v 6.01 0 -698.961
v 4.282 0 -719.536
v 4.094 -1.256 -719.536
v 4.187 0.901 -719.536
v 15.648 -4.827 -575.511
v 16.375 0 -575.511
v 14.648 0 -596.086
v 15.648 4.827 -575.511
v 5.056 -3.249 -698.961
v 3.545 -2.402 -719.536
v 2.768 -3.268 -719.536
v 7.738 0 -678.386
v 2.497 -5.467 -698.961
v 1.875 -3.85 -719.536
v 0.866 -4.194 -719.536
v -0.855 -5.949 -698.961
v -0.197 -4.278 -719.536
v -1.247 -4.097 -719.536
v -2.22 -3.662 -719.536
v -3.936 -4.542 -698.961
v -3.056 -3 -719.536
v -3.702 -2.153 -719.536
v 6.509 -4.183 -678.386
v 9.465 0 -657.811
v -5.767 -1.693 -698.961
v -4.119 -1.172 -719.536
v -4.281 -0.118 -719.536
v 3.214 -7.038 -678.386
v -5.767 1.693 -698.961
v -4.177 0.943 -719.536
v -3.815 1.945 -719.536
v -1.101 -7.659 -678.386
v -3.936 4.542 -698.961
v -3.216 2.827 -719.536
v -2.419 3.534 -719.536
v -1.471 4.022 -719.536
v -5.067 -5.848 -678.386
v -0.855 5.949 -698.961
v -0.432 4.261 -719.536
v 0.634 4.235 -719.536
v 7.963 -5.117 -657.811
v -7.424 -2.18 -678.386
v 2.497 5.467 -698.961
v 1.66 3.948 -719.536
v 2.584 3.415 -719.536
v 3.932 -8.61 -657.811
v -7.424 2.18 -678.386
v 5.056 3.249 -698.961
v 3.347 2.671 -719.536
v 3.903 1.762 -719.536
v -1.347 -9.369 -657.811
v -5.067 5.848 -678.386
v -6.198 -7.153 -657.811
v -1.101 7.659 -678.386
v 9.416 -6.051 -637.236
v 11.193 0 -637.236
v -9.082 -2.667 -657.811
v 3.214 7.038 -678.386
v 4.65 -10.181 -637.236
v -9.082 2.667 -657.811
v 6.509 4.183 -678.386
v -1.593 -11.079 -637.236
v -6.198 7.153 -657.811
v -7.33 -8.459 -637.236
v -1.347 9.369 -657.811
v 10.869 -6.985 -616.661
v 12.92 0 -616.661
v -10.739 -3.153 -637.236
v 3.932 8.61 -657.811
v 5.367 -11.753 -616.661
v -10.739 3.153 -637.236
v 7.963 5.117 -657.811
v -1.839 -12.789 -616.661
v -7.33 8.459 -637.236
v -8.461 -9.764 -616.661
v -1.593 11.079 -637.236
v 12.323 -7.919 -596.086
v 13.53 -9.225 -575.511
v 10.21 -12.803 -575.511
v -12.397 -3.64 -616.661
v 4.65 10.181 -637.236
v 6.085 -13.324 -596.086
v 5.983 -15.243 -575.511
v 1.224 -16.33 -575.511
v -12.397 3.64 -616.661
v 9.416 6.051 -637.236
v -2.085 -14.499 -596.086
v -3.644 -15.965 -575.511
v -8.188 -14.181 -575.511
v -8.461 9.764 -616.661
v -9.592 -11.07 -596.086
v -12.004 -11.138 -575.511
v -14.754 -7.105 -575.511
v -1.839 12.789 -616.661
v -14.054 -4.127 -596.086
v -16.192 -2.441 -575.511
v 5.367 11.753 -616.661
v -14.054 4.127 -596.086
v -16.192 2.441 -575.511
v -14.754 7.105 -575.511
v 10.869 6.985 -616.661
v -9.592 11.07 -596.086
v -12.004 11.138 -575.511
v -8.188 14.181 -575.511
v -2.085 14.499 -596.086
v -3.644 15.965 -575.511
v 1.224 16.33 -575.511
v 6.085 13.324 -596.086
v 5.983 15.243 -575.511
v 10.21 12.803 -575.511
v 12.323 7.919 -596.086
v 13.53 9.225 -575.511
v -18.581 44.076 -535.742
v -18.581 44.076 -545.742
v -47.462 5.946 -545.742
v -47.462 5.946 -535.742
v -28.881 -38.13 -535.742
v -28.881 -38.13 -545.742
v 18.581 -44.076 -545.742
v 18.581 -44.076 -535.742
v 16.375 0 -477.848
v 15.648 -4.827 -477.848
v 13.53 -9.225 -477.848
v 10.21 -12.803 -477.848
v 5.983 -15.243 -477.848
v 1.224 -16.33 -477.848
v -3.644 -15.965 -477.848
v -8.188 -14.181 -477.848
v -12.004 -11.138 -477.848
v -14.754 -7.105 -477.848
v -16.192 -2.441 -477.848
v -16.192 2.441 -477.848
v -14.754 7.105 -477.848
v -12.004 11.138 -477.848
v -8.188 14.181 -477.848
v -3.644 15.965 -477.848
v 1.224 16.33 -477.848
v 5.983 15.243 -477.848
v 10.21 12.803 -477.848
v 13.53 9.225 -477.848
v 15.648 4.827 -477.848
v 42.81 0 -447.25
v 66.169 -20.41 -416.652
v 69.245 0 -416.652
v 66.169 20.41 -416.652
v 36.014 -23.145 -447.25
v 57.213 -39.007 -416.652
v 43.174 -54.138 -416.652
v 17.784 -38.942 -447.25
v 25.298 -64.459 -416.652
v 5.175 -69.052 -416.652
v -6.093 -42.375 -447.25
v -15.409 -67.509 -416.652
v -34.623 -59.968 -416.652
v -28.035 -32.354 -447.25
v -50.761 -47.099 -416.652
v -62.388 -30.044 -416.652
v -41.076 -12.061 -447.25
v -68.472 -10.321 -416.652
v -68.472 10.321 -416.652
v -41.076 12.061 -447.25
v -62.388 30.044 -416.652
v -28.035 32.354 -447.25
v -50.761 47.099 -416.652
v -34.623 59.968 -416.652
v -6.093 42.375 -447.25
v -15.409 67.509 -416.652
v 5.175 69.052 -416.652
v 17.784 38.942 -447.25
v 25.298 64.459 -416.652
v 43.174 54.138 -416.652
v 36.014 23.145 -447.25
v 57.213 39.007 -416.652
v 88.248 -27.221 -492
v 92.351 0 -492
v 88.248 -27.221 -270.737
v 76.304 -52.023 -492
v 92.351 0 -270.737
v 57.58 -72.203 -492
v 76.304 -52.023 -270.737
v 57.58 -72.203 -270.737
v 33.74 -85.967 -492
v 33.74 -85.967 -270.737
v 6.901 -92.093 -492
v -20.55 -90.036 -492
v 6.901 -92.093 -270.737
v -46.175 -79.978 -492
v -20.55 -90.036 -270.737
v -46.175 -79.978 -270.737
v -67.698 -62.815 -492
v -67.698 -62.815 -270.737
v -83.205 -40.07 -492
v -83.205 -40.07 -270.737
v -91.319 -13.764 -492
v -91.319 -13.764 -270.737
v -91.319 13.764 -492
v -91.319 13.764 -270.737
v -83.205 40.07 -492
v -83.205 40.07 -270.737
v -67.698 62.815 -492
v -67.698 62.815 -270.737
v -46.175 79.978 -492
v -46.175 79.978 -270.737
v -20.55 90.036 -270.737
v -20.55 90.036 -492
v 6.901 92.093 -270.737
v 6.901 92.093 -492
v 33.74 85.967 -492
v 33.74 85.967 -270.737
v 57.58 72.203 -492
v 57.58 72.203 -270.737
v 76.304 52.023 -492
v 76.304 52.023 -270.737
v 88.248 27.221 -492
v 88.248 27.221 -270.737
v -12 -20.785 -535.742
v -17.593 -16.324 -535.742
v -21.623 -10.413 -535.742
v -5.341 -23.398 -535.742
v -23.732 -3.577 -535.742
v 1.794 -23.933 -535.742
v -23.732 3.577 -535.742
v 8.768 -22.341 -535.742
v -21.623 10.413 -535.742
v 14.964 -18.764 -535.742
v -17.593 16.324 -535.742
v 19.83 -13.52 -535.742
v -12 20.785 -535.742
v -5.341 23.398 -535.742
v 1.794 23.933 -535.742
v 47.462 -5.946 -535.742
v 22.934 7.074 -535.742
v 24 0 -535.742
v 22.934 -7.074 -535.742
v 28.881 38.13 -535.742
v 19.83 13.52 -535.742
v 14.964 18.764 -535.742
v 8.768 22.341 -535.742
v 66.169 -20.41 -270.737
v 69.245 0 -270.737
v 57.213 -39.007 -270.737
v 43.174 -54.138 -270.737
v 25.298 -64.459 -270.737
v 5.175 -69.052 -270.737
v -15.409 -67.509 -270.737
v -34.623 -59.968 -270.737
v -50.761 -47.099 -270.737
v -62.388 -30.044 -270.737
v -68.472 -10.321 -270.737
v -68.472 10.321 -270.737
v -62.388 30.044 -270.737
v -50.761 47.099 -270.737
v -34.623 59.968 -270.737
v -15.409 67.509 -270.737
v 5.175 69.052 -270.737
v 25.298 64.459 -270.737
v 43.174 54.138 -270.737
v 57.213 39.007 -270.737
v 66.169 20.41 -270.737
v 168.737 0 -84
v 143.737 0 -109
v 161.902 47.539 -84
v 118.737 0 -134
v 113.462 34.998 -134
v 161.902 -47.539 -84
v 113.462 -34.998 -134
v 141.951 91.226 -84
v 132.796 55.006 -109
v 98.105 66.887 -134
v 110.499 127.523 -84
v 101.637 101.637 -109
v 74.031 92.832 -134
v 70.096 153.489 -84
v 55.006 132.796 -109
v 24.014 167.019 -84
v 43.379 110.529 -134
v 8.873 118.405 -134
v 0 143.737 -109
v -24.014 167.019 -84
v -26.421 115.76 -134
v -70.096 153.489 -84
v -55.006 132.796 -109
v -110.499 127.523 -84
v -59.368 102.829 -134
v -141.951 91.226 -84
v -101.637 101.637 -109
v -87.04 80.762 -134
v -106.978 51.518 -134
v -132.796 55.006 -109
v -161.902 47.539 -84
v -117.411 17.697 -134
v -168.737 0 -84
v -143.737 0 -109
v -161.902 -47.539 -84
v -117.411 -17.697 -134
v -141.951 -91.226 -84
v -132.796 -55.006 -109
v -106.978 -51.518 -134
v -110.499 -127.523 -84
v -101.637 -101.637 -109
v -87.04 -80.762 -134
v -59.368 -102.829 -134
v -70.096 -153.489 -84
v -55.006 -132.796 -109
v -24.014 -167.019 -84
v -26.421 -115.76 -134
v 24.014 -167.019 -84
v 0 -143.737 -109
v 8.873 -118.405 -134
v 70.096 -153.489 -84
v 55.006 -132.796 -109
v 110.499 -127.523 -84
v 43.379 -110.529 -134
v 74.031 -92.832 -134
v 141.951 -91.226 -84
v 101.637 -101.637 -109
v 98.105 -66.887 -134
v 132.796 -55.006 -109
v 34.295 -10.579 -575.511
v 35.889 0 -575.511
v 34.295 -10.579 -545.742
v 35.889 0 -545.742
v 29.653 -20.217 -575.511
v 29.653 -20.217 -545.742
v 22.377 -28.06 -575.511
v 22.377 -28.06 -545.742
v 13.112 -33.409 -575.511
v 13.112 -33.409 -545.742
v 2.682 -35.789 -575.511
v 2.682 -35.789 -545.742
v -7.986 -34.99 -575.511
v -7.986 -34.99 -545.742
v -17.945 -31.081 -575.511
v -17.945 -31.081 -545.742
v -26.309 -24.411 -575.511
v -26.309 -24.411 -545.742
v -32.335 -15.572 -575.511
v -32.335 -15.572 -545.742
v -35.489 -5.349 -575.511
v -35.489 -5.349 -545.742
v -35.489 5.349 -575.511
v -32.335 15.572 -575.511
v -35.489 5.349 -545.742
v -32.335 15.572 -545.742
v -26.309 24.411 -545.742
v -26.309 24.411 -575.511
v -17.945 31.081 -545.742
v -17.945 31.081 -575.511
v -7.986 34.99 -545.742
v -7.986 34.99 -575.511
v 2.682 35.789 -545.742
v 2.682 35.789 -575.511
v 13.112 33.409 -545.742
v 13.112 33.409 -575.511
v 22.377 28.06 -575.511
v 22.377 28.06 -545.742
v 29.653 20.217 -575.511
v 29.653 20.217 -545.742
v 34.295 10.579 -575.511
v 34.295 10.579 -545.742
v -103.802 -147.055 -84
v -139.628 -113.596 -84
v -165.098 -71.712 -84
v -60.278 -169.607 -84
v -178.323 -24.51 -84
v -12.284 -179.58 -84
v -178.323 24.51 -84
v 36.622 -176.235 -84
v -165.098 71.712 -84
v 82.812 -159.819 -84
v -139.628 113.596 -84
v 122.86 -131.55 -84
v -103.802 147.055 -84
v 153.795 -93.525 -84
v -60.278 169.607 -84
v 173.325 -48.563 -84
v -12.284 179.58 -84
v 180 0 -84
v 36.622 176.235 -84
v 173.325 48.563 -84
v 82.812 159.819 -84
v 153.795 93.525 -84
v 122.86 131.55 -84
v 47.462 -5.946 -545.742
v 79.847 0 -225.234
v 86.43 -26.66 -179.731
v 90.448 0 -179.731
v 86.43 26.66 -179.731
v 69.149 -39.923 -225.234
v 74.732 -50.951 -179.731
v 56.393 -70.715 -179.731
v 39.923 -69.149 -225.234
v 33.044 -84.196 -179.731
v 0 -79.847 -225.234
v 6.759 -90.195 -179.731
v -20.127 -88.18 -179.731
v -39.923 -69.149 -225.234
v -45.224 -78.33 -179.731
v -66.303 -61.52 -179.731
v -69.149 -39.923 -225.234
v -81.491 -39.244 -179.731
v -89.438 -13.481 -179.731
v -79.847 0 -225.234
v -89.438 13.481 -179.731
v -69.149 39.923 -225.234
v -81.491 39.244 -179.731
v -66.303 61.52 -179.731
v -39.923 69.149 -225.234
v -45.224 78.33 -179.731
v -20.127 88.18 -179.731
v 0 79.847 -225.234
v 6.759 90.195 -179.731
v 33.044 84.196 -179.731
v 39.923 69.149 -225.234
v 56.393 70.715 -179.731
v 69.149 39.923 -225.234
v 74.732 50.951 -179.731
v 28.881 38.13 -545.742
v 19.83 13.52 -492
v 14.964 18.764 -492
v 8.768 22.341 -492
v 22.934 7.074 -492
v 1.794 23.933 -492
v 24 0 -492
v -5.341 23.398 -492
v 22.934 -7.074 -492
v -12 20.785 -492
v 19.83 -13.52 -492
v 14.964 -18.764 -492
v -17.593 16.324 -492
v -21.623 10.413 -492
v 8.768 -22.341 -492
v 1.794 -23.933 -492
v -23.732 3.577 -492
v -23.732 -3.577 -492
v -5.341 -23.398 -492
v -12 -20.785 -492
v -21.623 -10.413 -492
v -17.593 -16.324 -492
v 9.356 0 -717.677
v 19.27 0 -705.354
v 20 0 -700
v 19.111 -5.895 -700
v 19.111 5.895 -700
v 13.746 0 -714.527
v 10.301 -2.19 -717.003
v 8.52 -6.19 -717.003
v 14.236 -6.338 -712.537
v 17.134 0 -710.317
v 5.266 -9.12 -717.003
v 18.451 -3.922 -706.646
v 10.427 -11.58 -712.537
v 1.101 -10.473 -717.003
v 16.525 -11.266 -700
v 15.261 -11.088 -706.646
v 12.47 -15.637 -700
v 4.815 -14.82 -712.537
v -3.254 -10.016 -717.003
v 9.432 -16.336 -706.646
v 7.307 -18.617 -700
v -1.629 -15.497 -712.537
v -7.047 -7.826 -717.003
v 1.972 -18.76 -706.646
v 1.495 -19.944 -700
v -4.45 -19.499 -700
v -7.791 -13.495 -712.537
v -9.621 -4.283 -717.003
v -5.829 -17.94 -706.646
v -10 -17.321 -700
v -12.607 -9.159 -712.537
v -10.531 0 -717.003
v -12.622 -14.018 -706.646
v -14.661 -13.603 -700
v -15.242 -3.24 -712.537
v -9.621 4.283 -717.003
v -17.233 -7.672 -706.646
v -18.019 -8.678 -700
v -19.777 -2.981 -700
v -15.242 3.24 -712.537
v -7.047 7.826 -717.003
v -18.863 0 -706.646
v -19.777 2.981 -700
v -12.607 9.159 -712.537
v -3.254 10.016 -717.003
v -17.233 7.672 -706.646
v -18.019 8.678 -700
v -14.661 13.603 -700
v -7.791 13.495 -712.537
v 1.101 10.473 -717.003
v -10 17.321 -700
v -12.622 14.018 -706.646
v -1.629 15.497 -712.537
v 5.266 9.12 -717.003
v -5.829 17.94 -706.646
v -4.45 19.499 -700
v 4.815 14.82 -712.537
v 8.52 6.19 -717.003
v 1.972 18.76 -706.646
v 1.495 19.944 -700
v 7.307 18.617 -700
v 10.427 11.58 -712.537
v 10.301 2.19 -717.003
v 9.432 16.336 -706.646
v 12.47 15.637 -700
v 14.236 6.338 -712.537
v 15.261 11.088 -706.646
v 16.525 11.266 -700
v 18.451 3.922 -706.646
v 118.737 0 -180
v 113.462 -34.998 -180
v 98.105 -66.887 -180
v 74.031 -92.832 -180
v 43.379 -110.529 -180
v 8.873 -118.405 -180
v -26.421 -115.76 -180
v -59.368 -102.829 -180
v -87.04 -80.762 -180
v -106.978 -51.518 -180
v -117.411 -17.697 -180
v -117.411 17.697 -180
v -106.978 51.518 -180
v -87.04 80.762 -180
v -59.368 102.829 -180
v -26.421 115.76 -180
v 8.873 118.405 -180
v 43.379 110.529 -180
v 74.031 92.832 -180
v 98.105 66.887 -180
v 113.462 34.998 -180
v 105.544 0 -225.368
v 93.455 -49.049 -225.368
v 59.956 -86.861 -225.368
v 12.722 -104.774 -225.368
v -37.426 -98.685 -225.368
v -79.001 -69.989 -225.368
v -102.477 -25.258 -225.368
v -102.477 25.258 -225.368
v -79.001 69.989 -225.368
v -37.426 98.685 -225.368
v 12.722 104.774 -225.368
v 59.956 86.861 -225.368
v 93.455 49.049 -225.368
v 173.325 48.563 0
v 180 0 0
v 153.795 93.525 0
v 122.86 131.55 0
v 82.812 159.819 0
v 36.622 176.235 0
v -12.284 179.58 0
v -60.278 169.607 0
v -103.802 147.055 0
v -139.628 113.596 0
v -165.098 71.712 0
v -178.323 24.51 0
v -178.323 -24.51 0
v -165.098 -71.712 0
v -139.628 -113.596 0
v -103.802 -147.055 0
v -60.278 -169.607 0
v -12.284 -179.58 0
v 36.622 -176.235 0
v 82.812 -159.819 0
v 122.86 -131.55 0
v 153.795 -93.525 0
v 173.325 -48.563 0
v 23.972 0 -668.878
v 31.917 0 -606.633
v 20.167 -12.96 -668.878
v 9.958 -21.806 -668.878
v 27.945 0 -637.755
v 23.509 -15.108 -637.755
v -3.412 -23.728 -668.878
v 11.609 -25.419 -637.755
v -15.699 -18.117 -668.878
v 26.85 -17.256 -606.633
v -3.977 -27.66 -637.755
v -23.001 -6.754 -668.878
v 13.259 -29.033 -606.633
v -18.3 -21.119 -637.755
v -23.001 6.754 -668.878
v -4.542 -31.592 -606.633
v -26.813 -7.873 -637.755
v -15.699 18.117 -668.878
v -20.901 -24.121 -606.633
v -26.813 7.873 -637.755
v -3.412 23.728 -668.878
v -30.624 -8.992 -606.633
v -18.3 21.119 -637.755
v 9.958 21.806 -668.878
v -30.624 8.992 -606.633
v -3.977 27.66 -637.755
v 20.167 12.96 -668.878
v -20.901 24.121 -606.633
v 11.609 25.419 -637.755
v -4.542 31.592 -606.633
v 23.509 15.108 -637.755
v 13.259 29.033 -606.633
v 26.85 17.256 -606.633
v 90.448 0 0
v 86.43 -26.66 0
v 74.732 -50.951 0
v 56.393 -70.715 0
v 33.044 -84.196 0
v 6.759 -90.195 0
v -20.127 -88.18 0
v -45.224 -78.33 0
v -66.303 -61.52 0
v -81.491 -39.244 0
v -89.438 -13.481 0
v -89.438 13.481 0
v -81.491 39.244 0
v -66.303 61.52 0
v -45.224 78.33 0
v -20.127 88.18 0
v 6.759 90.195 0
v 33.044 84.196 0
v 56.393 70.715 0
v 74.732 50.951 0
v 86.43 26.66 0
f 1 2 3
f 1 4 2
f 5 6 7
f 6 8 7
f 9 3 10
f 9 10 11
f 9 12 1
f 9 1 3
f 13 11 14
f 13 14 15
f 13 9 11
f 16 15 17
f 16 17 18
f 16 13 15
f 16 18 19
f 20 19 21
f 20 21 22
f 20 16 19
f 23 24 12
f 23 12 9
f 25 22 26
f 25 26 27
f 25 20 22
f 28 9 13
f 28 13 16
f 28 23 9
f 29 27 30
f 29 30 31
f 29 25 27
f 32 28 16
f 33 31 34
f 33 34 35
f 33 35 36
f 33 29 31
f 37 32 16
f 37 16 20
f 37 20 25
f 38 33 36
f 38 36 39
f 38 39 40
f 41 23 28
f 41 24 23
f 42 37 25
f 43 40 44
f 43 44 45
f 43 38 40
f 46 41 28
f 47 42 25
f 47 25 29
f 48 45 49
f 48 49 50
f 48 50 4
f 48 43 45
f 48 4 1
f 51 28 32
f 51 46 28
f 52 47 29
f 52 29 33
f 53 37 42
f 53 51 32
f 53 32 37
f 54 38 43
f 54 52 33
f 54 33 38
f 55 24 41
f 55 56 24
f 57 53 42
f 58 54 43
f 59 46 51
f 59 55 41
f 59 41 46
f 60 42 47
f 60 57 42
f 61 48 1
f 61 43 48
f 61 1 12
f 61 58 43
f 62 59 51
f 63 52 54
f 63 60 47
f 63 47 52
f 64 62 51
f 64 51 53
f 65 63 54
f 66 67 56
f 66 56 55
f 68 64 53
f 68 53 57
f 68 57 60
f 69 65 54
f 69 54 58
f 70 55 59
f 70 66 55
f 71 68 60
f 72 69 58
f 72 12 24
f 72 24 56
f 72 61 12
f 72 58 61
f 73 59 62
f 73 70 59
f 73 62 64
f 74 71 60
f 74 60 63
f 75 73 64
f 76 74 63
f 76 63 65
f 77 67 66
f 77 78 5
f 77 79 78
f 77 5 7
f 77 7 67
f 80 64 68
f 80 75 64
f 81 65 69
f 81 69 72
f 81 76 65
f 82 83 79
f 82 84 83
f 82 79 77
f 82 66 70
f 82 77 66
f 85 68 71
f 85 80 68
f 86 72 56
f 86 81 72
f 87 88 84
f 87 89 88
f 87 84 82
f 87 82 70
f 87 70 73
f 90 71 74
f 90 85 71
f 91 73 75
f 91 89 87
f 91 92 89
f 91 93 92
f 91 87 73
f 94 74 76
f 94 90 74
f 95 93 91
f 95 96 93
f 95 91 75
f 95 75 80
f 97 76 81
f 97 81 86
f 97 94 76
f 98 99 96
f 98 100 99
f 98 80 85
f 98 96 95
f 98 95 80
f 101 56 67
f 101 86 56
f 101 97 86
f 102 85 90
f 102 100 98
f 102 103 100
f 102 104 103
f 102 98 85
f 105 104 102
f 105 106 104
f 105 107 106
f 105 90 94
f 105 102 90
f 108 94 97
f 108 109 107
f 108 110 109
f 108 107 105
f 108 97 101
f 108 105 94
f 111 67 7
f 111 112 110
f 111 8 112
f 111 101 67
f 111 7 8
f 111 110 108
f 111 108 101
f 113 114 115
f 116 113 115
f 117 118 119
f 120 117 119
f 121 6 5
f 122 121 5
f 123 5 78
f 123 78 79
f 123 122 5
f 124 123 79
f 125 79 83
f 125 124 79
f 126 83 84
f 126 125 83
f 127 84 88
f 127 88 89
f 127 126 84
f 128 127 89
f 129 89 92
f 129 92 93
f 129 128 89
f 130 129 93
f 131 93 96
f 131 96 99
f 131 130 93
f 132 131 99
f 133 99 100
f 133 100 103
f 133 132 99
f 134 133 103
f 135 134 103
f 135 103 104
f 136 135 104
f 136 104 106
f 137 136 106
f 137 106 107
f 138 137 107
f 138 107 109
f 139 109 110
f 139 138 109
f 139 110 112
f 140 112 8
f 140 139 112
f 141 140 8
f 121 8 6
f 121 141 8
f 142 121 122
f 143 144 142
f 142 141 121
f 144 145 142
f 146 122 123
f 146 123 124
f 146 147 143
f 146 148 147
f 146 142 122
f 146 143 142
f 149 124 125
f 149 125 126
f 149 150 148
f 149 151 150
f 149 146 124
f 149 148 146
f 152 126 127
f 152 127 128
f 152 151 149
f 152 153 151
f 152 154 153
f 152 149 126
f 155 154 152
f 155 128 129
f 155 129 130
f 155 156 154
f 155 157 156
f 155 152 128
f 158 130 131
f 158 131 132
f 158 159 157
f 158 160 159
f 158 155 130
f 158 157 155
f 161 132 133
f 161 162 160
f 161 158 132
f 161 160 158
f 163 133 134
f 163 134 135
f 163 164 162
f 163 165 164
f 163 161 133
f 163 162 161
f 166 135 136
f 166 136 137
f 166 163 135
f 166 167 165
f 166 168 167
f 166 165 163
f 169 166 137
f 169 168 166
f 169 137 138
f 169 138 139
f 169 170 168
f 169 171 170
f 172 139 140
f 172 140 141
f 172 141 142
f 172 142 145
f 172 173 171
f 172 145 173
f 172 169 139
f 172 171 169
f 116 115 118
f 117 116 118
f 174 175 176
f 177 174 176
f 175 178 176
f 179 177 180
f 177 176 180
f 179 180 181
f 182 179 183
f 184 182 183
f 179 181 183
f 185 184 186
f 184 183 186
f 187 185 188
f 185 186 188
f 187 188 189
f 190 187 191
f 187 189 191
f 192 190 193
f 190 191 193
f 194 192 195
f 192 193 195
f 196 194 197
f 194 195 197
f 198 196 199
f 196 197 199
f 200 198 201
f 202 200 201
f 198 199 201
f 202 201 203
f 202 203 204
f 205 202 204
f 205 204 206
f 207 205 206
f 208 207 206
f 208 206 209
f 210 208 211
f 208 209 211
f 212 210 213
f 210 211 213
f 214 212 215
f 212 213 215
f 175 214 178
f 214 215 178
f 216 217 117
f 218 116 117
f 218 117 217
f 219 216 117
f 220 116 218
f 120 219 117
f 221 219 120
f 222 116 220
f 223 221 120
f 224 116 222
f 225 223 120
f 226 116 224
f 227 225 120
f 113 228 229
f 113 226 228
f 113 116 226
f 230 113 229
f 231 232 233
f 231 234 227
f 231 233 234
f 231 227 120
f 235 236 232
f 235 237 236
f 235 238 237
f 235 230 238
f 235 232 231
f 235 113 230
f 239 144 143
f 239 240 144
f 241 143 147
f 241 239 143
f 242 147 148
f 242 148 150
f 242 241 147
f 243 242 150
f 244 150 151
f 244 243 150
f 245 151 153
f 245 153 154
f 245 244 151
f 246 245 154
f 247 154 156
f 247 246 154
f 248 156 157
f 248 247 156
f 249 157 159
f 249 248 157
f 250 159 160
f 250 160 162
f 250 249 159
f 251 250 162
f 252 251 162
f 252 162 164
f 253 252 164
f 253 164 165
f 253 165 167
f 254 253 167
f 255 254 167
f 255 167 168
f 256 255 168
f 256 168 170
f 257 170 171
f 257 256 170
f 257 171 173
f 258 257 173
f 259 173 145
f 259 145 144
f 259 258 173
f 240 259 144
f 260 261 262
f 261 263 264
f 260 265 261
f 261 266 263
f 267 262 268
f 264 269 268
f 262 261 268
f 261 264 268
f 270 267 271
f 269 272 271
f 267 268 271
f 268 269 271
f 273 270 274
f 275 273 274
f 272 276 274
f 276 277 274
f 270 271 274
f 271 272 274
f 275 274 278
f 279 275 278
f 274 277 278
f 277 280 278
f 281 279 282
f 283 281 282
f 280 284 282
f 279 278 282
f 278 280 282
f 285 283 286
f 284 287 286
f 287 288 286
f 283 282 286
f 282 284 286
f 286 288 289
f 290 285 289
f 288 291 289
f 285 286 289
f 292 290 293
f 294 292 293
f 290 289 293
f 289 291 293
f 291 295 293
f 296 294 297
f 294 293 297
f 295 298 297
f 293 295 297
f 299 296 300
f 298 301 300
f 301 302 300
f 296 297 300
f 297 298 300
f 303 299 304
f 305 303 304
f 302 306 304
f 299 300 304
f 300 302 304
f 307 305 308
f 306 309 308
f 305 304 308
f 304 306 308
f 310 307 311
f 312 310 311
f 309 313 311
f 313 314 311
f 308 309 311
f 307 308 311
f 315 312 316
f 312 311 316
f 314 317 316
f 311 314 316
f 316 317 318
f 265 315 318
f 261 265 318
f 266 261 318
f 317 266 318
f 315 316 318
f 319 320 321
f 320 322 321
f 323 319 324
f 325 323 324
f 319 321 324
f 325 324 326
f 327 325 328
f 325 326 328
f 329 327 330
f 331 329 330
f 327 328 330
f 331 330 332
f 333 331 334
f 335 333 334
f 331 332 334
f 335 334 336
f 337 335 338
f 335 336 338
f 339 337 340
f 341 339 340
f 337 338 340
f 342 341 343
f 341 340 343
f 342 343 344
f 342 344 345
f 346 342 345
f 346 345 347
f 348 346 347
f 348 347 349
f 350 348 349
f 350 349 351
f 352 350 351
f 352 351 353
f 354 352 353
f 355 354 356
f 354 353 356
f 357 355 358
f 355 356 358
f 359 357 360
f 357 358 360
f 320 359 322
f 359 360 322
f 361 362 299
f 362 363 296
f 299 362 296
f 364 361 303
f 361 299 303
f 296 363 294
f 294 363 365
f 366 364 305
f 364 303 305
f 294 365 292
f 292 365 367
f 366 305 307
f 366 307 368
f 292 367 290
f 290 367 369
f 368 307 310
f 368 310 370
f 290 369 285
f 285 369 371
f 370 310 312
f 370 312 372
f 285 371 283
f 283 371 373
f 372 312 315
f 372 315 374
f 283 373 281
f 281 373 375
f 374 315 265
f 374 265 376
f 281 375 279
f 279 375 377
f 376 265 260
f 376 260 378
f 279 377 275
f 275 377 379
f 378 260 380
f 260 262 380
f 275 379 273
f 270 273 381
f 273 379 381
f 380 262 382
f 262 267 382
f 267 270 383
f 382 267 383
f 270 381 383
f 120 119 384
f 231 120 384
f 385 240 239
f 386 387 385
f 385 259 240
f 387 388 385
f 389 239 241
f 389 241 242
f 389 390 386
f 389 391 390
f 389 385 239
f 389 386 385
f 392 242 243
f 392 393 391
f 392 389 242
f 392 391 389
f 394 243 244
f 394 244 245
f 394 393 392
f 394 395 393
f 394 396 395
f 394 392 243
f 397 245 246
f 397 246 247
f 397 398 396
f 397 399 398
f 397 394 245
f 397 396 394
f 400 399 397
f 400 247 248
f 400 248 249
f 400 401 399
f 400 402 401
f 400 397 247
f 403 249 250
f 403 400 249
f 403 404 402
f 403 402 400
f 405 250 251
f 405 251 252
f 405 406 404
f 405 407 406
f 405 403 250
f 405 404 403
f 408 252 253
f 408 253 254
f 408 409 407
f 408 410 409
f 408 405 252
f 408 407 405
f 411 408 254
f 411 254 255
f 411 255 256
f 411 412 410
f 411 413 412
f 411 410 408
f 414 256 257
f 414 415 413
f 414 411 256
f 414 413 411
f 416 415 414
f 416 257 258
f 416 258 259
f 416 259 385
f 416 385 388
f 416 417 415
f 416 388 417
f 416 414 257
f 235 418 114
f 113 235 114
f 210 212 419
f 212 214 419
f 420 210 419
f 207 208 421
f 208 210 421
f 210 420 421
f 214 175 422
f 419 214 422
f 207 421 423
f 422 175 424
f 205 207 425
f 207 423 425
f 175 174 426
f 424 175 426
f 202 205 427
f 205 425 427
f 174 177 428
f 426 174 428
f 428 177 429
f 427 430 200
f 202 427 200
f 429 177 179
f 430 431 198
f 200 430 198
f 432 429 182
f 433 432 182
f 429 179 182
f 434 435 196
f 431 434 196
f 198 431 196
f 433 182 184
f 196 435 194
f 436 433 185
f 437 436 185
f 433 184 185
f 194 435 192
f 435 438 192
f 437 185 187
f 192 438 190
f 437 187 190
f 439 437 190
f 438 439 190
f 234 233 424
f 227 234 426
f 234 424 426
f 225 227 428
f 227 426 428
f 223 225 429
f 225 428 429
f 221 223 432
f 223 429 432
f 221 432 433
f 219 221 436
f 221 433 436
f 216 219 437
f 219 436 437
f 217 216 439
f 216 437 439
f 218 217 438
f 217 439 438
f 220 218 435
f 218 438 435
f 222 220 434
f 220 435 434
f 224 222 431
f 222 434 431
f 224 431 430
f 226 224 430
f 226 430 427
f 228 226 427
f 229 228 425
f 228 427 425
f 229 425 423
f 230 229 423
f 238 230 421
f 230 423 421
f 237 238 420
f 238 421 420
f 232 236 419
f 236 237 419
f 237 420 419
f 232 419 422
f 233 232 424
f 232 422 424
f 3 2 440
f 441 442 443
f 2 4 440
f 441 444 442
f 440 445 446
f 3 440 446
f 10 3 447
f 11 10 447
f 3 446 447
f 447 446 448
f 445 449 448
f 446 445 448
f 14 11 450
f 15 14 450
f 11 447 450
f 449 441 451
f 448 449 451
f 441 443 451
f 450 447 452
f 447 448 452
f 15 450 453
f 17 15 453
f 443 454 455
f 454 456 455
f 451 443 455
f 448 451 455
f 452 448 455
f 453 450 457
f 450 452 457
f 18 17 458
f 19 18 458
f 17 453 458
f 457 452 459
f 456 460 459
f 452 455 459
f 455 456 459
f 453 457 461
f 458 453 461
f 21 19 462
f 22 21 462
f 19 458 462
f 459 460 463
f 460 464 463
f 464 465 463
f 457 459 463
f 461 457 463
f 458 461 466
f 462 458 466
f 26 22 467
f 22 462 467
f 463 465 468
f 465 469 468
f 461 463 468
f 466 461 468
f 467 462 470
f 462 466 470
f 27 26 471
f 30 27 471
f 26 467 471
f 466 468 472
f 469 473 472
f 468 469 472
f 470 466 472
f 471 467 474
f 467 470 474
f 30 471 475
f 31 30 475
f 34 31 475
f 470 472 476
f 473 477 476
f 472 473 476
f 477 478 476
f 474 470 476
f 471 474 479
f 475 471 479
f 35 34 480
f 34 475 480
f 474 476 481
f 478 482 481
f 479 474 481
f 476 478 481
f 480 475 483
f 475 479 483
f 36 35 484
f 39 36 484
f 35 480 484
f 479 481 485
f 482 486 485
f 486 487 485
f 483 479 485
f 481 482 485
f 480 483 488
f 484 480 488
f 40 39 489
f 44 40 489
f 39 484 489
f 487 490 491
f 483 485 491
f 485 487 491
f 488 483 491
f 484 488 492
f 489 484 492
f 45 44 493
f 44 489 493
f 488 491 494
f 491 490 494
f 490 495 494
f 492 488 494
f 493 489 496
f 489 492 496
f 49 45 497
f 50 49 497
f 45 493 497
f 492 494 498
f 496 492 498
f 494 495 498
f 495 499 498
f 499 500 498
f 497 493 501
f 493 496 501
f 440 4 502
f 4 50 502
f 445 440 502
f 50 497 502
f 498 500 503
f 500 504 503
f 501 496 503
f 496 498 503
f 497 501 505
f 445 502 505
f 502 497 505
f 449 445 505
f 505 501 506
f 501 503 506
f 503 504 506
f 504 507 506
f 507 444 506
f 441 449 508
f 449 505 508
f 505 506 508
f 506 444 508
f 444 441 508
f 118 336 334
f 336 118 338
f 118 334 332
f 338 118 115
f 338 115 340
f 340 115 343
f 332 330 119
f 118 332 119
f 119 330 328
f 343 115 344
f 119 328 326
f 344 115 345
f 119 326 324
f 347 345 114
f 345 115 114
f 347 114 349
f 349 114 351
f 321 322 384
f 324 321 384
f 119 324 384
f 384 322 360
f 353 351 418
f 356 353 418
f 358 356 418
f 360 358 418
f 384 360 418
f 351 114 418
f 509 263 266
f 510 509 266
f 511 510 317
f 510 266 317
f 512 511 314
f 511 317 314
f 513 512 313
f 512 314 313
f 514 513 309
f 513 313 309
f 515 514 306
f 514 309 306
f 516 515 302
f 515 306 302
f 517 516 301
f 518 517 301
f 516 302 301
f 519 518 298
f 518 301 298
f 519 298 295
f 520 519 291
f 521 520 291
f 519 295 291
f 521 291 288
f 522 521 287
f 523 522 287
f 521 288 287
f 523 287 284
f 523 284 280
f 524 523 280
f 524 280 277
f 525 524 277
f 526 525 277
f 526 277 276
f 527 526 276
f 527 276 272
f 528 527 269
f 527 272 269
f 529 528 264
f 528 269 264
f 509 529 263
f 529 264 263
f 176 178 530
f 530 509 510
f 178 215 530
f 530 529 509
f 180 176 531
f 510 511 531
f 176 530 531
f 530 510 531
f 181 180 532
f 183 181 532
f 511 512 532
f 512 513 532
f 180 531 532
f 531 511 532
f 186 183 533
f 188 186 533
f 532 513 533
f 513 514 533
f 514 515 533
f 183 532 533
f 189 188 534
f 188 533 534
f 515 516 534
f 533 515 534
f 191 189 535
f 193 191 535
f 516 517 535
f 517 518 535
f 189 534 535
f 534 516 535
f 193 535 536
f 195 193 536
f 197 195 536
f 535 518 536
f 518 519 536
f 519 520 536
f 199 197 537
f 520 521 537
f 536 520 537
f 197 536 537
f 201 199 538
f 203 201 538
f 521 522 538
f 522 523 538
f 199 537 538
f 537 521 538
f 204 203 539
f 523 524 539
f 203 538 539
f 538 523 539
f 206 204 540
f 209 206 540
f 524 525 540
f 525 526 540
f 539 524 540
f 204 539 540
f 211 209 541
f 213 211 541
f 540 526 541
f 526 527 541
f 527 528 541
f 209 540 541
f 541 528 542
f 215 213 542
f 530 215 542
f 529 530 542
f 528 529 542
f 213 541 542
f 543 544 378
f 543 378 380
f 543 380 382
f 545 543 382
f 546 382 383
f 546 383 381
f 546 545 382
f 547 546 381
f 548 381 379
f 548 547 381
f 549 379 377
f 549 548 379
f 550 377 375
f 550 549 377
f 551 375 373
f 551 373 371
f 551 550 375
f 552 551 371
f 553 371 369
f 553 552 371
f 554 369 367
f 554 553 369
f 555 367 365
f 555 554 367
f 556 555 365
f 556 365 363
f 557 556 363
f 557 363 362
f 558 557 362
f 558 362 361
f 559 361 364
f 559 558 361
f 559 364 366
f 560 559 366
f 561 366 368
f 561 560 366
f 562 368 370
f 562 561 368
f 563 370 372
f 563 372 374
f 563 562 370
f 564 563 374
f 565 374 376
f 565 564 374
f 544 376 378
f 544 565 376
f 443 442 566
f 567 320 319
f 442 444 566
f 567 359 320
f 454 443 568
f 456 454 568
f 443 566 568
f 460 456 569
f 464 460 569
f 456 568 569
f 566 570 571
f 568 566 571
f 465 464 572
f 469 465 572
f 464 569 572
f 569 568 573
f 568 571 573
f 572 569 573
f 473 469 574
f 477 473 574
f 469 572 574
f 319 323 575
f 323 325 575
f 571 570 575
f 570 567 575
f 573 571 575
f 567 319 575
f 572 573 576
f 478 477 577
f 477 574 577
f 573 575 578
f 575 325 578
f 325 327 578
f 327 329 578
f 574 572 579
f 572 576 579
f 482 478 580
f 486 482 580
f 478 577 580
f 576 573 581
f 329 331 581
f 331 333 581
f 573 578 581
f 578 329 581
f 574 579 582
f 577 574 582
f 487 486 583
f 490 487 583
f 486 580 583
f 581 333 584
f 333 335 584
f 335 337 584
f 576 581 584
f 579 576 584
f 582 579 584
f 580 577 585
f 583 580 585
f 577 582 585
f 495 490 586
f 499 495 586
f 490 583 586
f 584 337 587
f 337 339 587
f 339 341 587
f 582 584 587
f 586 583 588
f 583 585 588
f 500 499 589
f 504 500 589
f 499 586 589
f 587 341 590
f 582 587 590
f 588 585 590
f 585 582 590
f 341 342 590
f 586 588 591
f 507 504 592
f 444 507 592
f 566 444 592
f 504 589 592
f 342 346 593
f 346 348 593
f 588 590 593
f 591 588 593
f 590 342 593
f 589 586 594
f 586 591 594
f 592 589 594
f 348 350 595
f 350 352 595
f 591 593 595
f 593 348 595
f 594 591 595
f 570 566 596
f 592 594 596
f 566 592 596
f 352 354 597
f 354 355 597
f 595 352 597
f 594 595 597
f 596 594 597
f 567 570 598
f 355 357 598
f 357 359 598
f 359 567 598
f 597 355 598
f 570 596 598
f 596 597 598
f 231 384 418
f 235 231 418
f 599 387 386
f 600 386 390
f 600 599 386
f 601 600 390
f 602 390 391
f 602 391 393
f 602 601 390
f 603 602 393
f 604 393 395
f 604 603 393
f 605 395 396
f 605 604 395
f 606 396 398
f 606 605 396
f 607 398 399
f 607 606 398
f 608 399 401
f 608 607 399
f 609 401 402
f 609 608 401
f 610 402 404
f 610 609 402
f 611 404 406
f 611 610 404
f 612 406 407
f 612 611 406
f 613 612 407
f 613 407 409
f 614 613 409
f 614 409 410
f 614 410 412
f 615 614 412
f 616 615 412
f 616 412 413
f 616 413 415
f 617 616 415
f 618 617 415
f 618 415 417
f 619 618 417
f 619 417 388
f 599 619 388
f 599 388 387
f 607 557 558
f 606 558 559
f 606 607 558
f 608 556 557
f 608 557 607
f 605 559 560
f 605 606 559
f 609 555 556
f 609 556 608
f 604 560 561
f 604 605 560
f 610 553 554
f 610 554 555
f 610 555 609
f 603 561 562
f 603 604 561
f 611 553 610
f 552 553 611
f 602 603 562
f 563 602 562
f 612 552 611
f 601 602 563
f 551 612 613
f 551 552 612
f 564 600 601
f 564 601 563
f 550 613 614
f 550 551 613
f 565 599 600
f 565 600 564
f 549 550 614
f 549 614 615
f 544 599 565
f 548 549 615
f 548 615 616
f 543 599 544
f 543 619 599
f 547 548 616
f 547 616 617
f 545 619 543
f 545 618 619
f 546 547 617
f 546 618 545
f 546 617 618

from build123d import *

# Parameters (mm, degrees)
BOSS_EXTRUDE1_DEPTH = 10
SKETCH5_R           = 180
SKETCH5_R_2         = 90.447985836
BOSS_EXTRUDE2_DEPTH = 84
CHAMFER1_SIZE       = 50


with BuildPart() as part:
    # Sketch2 → Revolve1 (revolve)
    with BuildSketch(Plane(origin=(0, 0, 0), x_dir=(0, 0, -1), z_dir=(1, 0, 0)), mode=Mode.PRIVATE) as revolve1_sk:
        with BuildLine():
            Line((0, 0), (700, 0))
            Line((700, 0), (720, 0))
            ThreePointArc((720, 0), (714.142135624, 14.142135624), (700, 20))
            Line((700, 20), (575.510554629, 35.889479609))
            Line((575.510554629, 35.889479609), (545.741946393, 35.889479609))
            Line((545.741946393, 35.889479609), (545.741946393, 24))
            Line((545.741946393, 24), (492, 24))
            Line((492, 24), (492, 92.350959719))
            Line((492, 92.350959719), (270.736708403, 92.350959719))
            Line((270.736708403, 92.350959719), (180, 118.736948211))
            Line((180, 118.736948211), (0, 118.736948211))
            Line((0, 118.736948211), (0, 0))
        make_face()
    revolve(revolve1_sk.sketch.rotate(Axis((0, 0, 0), (0, 0, -1)), 90), axis=Axis((0, 0, 0), (0, 0, -1)))

    # Sketch3 → Boss-Extrude1 (add)
    with BuildSketch(Plane.XY.offset(-545.741946393)):
        Polygon((47.46164508, -5.94638242), (28.880540777, 38.129799135), (-18.581104304, 44.076181555), (-47.46164508, 5.94638242), (-28.880540777, -38.129799135), (18.581104304, -44.076181555), align=None)
    extrude(amount=BOSS_EXTRUDE1_DEPTH)

    # Sketch4 → Cut-Revolve6 (revolve, cut)
    with BuildSketch(Plane(origin=(0, 0, 0), x_dir=(0, 0, -1), z_dir=(1, 0, 0)), mode=Mode.PRIVATE) as cut_revolve6_sk:
        Polygon((0, 0), (720, 0), (720, 4.24350933), (575.510554629, 16.375367187), (477.848045129, 16.375367187), (416.651810859, 69.245469072), (270.736708403, 69.245469072), (179.731042443, 90.447985836), (0, 90.447985836), align=None)
    revolve(cut_revolve6_sk.sketch.rotate(Axis((0, 0, 0), (0, 0, -1)), 90), axis=Axis((0, 0, 0), (0, 0, -1)), mode=Mode.SUBTRACT)

    # Sketch5 → Boss-Extrude2 (add)
    with BuildSketch(Plane.XY):
        Circle(SKETCH5_R)
        Circle(SKETCH5_R_2, mode=Mode.SUBTRACT)
    extrude(amount=-BOSS_EXTRUDE2_DEPTH)

    # Chamfer1
    chamfer1_edges = [part.edges().sort_by_distance(p)[0] for p in [
        (-118.736948211, 0, -84),
    ]]
    chamfer(chamfer1_edges, length=CHAMFER1_SIZE)


solid = part.part
